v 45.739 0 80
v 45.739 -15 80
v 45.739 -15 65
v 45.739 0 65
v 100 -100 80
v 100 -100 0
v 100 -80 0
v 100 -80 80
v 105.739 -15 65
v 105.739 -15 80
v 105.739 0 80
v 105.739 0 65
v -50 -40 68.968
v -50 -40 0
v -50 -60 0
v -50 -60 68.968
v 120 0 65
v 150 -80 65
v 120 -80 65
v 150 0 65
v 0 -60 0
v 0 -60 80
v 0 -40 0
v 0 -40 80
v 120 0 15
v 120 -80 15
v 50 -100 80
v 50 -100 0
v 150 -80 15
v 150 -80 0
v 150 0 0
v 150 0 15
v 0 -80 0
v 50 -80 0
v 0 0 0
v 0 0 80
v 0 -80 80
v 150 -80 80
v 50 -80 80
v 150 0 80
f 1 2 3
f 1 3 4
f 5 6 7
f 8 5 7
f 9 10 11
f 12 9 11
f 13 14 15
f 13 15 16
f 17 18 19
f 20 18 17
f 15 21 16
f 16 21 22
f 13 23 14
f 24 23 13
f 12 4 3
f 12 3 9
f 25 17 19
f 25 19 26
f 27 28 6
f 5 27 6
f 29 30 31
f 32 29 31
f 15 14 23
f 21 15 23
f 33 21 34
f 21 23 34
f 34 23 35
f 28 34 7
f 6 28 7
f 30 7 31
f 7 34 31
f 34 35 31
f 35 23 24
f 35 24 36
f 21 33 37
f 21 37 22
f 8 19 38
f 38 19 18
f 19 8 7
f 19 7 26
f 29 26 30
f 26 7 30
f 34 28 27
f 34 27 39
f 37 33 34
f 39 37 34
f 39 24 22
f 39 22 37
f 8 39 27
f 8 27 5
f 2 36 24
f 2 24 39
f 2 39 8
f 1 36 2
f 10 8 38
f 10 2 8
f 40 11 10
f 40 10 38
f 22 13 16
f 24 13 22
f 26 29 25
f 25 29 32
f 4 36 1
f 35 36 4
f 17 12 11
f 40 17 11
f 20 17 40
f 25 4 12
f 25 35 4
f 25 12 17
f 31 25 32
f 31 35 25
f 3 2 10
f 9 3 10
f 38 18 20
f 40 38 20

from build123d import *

# Parameters (mm, degrees)
SKETCH_1_W               = 50
SKETCH_1_H               = 20
SKETCH_1_W_2             = 150
SKETCH_1_H_2             = 80
EXTRUDE_3_DEPTH          = 80
SKETCH_3_W               = 80
SKETCH_3_H               = 20
EXTRUDE_4_DEPTH          = 50
CUT_EXTRUDE_1_DEPTH      = 181.277563773
CUT_EXTRUDE_1_DEPTH_BACK = 50
SKETCH_5_W               = 50
SKETCH_5_H               = 80
CUT_EXTRUDE_2_DEPTH      = 30
SKETCH_6_W               = 60
SKETCH_6_H               = 15
CUT_EXTRUDE_3_DEPTH      = 15


with BuildPart() as part:
    # Эскиз1 → Бобышка-Вытянуть3 (new body)
    with BuildSketch(Plane.XY):
        with Locations((75, -90)):
            Rectangle(SKETCH_1_W, SKETCH_1_H)
        with Locations((75, -40)):
            Rectangle(SKETCH_1_W_2, SKETCH_1_H_2)
    extrude(amount=EXTRUDE_3_DEPTH)

    # Эскиз3 → Бобышка-Вытянуть4 (add)
    with BuildSketch(Plane.ZY):
        with Locations((40, -50)):
            Rectangle(SKETCH_3_W, SKETCH_3_H)
    extrude(amount=EXTRUDE_4_DEPTH)

    # Эскиз4 → Вырез-Вытянуть1 (cut, two sides: drawn at the far end of the back side and taken through both)
    with BuildSketch(Plane.XZ.offset(60).offset(-CUT_EXTRUDE_1_DEPTH_BACK)):
        Polygon((-50, 70.981091189), (-50, 68.967879487), (0, 80), (-50, 80), align=None)
    extrude(amount=CUT_EXTRUDE_1_DEPTH + CUT_EXTRUDE_1_DEPTH_BACK, mode=Mode.SUBTRACT)

    # Эскиз5 → Вырез-Вытянуть2 (cut)
    with BuildSketch(Plane(origin=(150, 0, 0), x_dir=(0, 0, -1), z_dir=(1, 0, 0))):
        with Locations((-40, -40)):
            Rectangle(SKETCH_5_W, SKETCH_5_H)
    extrude(amount=-CUT_EXTRUDE_2_DEPTH, mode=Mode.SUBTRACT)

    # Эскиз6 → Вырез-Вытянуть3 (cut)
    with BuildSketch(Plane.XY.offset(80)):
        with Locations((75.739234494, -7.5)):
            Rectangle(SKETCH_6_W, SKETCH_6_H)
    extrude(amount=-CUT_EXTRUDE_3_DEPTH, mode=Mode.SUBTRACT)


solid = part.part
